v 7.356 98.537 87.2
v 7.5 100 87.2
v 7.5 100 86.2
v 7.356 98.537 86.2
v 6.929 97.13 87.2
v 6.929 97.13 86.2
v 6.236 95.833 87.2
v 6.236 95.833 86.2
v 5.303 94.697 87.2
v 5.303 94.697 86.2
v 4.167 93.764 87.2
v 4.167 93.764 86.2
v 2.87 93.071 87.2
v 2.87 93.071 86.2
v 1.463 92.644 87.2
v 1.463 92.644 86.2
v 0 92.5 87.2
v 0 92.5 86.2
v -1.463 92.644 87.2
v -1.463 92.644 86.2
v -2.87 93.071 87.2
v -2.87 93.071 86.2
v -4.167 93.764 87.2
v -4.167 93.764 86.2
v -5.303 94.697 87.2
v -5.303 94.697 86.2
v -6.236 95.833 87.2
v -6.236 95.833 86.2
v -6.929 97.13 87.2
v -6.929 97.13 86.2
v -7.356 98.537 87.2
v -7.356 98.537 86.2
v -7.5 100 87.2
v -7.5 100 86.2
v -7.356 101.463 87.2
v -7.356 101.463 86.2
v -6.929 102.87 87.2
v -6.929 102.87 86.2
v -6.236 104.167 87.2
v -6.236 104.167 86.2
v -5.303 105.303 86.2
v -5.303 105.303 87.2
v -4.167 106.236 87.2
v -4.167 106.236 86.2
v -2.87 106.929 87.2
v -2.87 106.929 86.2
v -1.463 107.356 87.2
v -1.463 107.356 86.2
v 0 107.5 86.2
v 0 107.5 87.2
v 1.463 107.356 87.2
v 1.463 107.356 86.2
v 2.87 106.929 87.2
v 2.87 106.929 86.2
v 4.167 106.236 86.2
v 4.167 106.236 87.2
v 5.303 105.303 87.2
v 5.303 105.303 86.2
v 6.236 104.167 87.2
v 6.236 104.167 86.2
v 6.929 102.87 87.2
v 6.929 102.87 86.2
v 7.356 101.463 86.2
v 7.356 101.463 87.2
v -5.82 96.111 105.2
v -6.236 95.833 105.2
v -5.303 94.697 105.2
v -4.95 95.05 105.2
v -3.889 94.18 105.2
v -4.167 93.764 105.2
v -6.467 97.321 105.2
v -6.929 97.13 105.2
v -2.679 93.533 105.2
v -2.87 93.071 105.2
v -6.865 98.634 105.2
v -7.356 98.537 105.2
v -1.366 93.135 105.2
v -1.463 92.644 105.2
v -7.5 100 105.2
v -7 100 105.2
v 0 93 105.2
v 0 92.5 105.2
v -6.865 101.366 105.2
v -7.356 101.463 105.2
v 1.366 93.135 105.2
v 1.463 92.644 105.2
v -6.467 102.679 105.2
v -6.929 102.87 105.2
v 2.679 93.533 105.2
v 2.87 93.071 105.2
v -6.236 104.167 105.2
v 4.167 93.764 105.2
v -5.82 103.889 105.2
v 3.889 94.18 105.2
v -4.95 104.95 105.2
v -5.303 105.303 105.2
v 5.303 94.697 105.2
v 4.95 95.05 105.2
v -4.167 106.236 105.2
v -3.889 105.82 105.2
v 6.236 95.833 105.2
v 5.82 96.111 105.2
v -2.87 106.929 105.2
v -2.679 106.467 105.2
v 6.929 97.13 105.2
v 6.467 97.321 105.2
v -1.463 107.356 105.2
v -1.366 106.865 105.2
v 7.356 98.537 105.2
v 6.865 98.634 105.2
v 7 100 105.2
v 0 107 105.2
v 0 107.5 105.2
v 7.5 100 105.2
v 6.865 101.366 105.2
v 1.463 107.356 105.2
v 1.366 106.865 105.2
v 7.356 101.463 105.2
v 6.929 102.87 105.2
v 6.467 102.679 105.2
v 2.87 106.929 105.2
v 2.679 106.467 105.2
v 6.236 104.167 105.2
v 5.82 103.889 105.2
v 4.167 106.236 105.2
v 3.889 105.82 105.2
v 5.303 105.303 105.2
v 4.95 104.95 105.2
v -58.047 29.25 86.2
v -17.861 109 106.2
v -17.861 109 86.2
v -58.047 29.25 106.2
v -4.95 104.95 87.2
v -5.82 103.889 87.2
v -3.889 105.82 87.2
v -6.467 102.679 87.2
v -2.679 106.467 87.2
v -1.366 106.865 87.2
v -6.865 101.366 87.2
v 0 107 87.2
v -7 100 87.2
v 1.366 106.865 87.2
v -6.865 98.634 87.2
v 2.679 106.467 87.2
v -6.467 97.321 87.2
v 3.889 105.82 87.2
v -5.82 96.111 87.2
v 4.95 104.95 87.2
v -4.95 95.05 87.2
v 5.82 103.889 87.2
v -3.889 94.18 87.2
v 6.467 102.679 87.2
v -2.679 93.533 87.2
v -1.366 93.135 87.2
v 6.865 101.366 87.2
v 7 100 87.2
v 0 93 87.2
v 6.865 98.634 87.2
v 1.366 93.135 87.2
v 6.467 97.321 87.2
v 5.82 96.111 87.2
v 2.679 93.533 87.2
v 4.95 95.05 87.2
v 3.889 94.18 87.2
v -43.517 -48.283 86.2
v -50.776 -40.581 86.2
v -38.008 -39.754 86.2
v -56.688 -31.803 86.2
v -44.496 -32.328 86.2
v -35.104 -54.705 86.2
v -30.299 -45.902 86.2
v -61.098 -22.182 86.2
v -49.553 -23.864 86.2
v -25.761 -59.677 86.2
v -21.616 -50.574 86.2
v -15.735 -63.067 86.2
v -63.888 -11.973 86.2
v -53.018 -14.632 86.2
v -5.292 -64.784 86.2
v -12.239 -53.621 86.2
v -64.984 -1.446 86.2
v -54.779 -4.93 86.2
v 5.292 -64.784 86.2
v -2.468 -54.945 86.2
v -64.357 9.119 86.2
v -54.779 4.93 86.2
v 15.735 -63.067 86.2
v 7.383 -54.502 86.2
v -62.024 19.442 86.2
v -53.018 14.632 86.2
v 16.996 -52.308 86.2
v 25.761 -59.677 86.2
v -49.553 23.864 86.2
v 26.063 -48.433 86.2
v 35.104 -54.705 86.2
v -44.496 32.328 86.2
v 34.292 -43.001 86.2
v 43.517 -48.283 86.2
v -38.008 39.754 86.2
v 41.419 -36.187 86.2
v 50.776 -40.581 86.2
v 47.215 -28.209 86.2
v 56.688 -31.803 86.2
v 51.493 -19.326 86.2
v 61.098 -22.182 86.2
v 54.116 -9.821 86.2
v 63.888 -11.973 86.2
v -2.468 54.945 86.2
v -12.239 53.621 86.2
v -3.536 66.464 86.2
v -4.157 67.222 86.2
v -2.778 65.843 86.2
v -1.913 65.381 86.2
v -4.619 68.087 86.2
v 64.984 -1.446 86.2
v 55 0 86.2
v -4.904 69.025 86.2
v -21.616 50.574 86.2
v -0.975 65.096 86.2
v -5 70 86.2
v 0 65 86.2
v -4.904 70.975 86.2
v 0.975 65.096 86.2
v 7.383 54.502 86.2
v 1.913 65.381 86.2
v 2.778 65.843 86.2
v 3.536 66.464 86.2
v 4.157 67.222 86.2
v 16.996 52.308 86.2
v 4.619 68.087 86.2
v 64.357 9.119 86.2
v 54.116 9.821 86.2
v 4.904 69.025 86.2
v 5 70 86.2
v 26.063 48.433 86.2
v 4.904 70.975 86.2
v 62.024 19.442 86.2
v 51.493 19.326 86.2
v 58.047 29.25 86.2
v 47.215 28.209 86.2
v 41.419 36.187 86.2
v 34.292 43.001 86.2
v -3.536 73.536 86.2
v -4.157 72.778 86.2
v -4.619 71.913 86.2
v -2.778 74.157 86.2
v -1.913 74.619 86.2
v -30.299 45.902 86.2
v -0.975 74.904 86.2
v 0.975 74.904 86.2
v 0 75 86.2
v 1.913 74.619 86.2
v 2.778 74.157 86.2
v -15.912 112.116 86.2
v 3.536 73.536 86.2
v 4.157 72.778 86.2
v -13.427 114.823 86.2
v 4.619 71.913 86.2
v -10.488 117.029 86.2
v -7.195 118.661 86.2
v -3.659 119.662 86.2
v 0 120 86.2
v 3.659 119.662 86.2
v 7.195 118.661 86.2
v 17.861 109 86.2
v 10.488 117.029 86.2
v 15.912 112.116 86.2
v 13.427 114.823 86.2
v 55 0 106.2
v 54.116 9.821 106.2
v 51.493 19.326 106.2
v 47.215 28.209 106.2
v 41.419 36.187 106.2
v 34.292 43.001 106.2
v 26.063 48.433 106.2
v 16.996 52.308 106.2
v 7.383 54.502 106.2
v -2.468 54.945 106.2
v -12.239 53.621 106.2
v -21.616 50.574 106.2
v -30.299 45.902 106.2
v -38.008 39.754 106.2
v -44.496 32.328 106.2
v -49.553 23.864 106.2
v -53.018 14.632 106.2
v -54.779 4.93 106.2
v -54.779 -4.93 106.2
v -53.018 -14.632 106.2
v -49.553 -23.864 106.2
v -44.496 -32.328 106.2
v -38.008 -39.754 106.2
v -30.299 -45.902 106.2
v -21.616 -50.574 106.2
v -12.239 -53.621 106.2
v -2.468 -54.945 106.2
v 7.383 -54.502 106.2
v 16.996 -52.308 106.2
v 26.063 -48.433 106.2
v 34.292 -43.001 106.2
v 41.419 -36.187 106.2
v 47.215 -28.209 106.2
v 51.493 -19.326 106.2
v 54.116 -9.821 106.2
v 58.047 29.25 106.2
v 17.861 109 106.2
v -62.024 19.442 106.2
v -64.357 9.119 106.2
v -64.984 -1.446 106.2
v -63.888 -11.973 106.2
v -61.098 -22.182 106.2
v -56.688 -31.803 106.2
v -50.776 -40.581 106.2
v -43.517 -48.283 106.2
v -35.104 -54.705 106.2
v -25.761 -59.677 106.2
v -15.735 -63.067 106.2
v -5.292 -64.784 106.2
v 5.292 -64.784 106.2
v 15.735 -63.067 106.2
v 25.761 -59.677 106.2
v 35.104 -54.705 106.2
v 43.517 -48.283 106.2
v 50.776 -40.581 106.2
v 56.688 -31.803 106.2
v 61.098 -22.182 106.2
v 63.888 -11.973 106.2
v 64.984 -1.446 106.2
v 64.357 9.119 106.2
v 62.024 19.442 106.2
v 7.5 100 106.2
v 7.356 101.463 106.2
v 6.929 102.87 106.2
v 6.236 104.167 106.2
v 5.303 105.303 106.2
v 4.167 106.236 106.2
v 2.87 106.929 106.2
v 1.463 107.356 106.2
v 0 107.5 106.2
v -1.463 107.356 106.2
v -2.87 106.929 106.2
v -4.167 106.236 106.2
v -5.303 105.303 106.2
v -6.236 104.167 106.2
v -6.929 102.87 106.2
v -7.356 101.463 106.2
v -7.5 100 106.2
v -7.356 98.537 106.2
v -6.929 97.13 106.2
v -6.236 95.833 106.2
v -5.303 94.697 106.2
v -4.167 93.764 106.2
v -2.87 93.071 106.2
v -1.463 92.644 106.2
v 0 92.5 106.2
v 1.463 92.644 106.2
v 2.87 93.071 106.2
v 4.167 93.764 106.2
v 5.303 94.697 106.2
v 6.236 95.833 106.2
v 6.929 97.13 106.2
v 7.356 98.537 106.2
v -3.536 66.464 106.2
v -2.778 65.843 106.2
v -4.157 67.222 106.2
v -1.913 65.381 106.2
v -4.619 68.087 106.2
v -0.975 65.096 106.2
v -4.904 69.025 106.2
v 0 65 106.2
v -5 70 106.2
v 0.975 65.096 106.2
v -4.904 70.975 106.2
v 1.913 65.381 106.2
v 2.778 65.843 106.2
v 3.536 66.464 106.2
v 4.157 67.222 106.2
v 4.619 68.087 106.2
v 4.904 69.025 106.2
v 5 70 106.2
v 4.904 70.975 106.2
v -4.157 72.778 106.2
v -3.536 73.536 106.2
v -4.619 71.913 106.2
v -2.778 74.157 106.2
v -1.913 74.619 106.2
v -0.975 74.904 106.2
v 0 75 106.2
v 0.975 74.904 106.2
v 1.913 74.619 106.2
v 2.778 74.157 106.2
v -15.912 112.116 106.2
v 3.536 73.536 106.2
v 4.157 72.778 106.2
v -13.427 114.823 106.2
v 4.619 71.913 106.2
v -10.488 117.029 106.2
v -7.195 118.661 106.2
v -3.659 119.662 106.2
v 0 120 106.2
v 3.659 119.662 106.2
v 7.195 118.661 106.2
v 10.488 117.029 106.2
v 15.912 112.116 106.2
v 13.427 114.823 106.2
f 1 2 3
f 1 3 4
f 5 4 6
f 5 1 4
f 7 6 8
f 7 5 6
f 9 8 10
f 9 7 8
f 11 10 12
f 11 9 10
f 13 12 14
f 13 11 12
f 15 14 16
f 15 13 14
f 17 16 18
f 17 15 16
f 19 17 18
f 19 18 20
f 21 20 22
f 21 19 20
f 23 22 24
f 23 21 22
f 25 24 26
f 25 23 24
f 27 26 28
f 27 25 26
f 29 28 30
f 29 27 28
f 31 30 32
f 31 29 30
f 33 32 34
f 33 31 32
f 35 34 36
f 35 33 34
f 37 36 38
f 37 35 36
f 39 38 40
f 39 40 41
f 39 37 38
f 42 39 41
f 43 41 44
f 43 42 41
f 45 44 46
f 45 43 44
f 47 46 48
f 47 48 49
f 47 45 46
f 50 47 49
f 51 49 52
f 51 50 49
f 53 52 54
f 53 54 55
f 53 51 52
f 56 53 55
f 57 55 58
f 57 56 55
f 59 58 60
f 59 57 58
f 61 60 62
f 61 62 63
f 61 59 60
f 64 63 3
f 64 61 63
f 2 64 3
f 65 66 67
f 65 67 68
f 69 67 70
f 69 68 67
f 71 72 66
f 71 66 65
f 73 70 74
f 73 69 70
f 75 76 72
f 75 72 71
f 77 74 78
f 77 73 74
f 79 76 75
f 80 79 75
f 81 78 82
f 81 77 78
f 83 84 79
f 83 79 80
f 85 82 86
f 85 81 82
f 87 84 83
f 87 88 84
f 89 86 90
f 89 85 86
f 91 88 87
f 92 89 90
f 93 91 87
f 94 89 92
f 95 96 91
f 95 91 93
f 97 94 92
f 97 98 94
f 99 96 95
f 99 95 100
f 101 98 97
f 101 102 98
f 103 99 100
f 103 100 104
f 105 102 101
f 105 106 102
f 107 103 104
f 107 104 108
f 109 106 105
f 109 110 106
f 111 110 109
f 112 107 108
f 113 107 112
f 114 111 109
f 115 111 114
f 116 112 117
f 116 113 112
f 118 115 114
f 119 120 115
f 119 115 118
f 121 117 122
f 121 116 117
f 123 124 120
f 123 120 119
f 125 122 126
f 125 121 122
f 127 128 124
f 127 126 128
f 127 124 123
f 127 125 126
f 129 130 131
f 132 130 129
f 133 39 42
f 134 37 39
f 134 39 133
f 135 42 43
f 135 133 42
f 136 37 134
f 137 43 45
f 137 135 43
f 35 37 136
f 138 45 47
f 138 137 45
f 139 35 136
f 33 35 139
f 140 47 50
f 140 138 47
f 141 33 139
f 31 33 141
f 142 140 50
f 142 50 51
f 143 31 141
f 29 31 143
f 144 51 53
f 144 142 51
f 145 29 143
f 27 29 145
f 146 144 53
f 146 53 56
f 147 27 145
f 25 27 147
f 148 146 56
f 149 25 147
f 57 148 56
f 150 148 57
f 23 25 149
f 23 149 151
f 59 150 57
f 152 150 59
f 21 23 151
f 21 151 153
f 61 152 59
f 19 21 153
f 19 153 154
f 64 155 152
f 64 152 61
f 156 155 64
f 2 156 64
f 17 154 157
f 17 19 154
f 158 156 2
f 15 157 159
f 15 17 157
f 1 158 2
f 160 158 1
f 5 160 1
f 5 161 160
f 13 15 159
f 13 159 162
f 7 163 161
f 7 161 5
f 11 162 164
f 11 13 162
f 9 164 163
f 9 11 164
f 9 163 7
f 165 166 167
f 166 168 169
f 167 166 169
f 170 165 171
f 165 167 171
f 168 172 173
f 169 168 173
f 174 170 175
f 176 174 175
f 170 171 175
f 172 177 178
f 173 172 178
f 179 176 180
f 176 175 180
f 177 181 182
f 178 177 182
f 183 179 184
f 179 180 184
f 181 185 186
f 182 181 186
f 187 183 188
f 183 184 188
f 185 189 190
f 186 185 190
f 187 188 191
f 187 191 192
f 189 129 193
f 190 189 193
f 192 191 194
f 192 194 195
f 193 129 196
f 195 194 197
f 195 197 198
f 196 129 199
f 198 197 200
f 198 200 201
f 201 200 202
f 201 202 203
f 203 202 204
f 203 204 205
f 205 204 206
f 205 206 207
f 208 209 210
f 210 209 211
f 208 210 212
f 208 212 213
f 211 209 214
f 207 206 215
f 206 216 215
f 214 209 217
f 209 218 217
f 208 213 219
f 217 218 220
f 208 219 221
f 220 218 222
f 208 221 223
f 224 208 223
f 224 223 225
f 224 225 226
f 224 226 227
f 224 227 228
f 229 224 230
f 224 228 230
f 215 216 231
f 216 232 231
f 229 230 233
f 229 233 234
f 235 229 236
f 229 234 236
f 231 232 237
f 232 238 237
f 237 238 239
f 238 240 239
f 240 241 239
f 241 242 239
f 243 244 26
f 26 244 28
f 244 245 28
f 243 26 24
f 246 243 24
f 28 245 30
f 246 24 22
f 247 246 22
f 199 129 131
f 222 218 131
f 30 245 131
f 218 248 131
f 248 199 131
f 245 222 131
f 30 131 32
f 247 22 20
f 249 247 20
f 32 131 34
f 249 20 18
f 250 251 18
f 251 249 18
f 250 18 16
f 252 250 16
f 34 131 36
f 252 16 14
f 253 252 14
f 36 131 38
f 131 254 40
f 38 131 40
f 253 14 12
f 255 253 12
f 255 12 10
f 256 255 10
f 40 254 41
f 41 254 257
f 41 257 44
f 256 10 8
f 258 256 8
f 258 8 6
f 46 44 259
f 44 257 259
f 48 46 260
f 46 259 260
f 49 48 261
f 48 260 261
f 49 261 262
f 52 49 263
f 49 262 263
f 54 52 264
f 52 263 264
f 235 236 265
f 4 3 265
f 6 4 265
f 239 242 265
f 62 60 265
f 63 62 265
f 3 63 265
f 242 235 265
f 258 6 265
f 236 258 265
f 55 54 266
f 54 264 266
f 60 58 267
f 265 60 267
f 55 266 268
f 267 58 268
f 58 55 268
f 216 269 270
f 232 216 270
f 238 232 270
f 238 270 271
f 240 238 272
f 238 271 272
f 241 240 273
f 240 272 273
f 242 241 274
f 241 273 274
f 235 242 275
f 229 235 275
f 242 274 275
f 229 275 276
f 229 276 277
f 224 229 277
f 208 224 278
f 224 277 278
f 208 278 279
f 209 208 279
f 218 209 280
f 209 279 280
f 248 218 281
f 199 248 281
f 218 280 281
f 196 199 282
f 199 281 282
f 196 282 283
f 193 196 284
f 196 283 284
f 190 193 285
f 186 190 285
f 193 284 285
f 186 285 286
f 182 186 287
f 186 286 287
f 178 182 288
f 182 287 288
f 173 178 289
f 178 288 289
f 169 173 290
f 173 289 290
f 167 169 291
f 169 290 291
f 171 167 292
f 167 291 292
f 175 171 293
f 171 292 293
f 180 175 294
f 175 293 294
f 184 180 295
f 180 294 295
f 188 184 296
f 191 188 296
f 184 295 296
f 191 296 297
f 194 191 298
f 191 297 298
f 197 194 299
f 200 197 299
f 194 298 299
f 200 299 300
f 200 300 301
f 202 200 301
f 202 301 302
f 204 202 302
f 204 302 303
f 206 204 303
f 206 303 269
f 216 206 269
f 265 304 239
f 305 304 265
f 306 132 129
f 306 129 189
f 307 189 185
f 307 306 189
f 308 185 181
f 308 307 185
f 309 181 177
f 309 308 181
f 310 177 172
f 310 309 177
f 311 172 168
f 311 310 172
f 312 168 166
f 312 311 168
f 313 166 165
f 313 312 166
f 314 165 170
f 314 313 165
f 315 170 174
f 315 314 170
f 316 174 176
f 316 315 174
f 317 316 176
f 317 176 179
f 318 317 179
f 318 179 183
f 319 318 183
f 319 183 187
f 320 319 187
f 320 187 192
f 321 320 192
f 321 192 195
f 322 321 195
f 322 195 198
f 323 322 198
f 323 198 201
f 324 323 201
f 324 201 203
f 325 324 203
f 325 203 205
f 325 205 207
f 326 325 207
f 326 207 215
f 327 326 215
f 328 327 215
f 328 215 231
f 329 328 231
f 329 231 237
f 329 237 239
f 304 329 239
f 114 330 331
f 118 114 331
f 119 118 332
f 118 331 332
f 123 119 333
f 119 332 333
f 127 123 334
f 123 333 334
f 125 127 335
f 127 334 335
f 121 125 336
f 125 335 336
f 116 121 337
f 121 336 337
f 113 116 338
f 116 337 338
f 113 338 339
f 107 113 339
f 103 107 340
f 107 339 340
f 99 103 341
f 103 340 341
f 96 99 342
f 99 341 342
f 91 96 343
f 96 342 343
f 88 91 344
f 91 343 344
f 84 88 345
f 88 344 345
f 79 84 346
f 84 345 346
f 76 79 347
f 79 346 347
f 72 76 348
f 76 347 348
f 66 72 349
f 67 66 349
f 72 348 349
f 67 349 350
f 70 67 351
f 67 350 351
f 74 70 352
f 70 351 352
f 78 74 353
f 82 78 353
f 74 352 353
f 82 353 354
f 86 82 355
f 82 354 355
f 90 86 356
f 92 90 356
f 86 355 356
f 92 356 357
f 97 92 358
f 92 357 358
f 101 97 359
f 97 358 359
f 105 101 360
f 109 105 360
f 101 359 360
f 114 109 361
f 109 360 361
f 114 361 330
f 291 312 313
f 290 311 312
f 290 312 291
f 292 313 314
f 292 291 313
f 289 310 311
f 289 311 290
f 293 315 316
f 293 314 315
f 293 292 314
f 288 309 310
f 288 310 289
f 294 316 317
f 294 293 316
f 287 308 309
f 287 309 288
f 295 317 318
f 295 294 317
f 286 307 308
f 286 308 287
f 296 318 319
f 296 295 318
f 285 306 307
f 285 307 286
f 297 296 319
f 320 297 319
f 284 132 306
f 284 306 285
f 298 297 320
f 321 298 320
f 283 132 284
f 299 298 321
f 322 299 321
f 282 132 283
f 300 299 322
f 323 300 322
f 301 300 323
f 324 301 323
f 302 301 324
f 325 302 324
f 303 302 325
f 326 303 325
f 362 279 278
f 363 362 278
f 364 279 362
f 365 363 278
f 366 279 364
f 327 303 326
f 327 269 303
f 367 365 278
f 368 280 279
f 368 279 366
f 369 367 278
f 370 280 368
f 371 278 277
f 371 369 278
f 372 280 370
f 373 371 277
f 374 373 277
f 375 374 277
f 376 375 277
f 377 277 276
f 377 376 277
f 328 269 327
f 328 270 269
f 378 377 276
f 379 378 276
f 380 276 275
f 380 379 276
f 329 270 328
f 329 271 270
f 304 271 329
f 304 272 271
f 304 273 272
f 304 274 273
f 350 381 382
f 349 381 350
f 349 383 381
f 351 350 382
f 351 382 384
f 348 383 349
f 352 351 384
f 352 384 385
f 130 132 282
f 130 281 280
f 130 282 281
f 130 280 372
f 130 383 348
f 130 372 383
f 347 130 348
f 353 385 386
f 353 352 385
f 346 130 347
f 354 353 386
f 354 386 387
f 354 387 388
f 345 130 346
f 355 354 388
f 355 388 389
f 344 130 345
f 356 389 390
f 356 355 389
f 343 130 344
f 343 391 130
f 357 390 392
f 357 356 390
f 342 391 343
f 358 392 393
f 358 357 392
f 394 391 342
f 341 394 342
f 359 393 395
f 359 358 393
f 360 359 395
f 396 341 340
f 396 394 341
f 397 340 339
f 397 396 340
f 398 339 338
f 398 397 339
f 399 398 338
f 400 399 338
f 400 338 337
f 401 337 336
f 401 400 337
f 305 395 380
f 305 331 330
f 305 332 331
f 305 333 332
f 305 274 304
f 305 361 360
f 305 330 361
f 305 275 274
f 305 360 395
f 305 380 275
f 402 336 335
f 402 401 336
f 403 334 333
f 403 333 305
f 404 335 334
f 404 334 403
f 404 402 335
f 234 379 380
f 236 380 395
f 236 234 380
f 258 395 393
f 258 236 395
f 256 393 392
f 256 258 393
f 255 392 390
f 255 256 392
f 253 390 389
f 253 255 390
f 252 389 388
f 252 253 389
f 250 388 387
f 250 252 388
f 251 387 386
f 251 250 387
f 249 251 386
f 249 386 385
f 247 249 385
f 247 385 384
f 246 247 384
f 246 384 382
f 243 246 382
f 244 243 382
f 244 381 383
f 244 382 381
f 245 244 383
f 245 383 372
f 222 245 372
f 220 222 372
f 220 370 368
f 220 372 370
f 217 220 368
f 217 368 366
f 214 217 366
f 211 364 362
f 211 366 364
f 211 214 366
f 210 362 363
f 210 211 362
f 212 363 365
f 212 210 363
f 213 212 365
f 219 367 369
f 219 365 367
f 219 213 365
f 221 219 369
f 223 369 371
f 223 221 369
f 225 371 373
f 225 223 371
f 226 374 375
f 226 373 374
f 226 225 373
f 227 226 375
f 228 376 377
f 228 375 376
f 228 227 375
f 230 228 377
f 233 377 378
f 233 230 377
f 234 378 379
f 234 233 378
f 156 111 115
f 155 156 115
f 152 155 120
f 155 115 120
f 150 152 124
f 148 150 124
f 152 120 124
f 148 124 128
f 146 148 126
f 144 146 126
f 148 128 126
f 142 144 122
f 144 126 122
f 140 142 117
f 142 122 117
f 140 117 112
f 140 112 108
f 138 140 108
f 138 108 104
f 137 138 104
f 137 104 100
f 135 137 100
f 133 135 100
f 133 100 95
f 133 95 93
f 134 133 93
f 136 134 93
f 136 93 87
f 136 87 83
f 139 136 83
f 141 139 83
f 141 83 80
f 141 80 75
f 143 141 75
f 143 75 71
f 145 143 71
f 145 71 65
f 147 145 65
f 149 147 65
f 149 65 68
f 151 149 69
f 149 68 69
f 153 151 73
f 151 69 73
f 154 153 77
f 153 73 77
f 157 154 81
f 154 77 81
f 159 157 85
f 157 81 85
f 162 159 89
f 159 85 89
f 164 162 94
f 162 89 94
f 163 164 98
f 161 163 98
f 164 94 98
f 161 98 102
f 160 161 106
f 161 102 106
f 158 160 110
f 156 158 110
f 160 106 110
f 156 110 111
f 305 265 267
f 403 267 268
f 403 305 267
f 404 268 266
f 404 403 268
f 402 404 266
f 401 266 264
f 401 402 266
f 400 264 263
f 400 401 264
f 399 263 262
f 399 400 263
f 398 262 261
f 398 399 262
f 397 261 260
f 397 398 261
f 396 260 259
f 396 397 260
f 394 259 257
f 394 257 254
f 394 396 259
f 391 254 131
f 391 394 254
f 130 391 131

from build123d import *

# Parameters (mm, degrees)
SKETCH2_R           = 5
BOSS_EXTRUDE1_DEPTH = 10
SKETCH3_R           = 10
SKETCH3_R_2         = 5
BOSS_EXTRUDE2_DEPTH = 76.2
BOSS_EXTRUDE3_START = 86.2
SKETCH2_2_R         = 5
BOSS_EXTRUDE3_DEPTH = 20
SKETCH5_R           = 65
BOSS_EXTRUDE4_DEPTH = 20
SKETCH6_R           = 55
CUT_EXTRUDE1_DEPTH  = 20
SKETCH7_R           = 80
CUT_EXTRUDE2_DEPTH  = 135.370532484
SKETCH8_R           = 7
BOSS_EXTRUDE6_DEPTH = 20
SKETCH9_R           = 7.5
CUT_EXTRUDE3_DEPTH  = 1
CUT_EXTRUDE4_START  = -1
SKETCH10_R          = 7.5
CUT_EXTRUDE4_DEPTH  = 1


with BuildPart() as part:
    # Sketch2 → Boss-Extrude1 (new body)
    with BuildSketch(Plane.XY):
        with BuildLine():
            Line((-19.794866372, 2.857142857), (-9.897433186, 71.428571429))
            ThreePointArc((-9.897433186, 71.428571429), (0, 80), (9.897433186, 71.428571429))
            Line((9.897433186, 71.428571429), (19.794866372, 2.857142857))
            ThreePointArc((19.794866372, 2.857142857), (0, -20), (-19.794866372, 2.857142857))
        make_face()
        with Locations((0, 70)):
            Circle(SKETCH2_R, mode=Mode.SUBTRACT)
        with BuildLine():
            Line((-2.5, 9.682458366), (-2.5, 12))
            Line((-2.5, 12), (2.5, 12))
            Line((2.5, 12), (2.5, 9.682458366))
            ThreePointArc((2.5, 9.682458366), (0, -10), (-2.5, 9.682458366))
        make_face(mode=Mode.SUBTRACT)
    extrude(amount=BOSS_EXTRUDE1_DEPTH)

    # Sketch3 → Boss-Extrude2 (add)
    with BuildSketch(Plane.XY.offset(10)):
        with Locations(Location((0, 70, 0), (0, 0, 171.786789298))):
            Circle(SKETCH3_R)
        with Locations((0, 70)):
            Circle(SKETCH3_R_2, mode=Mode.SUBTRACT)
    extrude(amount=BOSS_EXTRUDE2_DEPTH)

    # Sketch2<2> → Boss-Extrude3 (add)
    with BuildSketch(Plane.XY.offset(BOSS_EXTRUDE3_START)):
        with BuildLine():
            Line((-19.794866372, 2.857142857), (-9.897433186, 71.428571429))
            ThreePointArc((-9.897433186, 71.428571429), (0, 80), (9.897433186, 71.428571429))
            Line((9.897433186, 71.428571429), (19.794866372, 2.857142857))
            ThreePointArc((19.794866372, 2.857142857), (0, -20), (-19.794866372, 2.857142857))
        make_face()
        with Locations((0, 70)):
            Circle(SKETCH2_2_R, mode=Mode.SUBTRACT)
        with BuildLine():
            Line((-2.5, 9.682458366), (-2.5, 12))
            Line((-2.5, 12), (2.5, 12))
            Line((2.5, 12), (2.5, 9.682458366))
            ThreePointArc((2.5, 9.682458366), (0, -10), (-2.5, 9.682458366))
        make_face(mode=Mode.SUBTRACT)
    extrude(amount=BOSS_EXTRUDE3_DEPTH)

    # Sketch5 → Boss-Extrude4 (add)
    with BuildSketch(Plane.XY.offset(106.2)):
        Circle(SKETCH5_R)
    extrude(amount=-BOSS_EXTRUDE4_DEPTH)

    # Sketch6 → Cut-Extrude1 (cut)
    with BuildSketch(Plane.XY.offset(106.2)):
        Circle(SKETCH6_R)
    extrude(amount=-CUT_EXTRUDE1_DEPTH, mode=Mode.SUBTRACT)

    # Sketch7 → Cut-Extrude2 (cut, through all)
    with BuildSketch(Plane(origin=(0, 0, 86.2), x_dir=(-1, 0, 0), z_dir=(0, 0, -1))):
        Circle(SKETCH7_R)
    extrude(amount=CUT_EXTRUDE2_DEPTH, mode=Mode.SUBTRACT)

    # Sketch8 → Boss-Extrude6 (add)
    with BuildSketch(Plane.XY.offset(106.2)):
        with BuildLine():
            Line((-17.860571099, 109), (-58.046856073, 29.25))
            ThreePointArc((-58.046856073, 29.25), (-38.646753366, 52.263069698), (-10.959640032, 64.06938653))
            Line((-10.959640032, 64.06938653), (-9.897433186, 71.428571429))
            ThreePointArc((-9.897433186, 71.428571429), (0, 80), (9.897433186, 71.428571429))
            Line((9.897433186, 71.428571429), (10.959640032, 64.06938653))
            ThreePointArc((10.959640032, 64.06938653), (38.646753366, 52.263069698), (58.046856073, 29.25))
            Line((58.046856073, 29.25), (17.860571099, 109))
            ThreePointArc((17.860571099, 109), (0, 120), (-17.860571099, 109))
        make_face()
        with Locations((0, 100)):
            Circle(SKETCH8_R, mode=Mode.SUBTRACT)
    extrude(amount=-BOSS_EXTRUDE6_DEPTH)

    # Sketch9 → Cut-Extrude3 (cut)
    with BuildSketch(Plane.XY.offset(106.2)):
        with Locations((0, 100)):
            Circle(SKETCH9_R)
    extrude(amount=-CUT_EXTRUDE3_DEPTH, mode=Mode.SUBTRACT)

    # Sketch10 → Cut-Extrude4 (cut)
    with BuildSketch(Plane(origin=(0, 0, 86.2), x_dir=(-1, 0, 0), z_dir=(0, 0, -1)).offset(CUT_EXTRUDE4_START)):
        with Locations(Location((0, 100, 0), (0, 0, 180))):
            Circle(SKETCH10_R)
    extrude(amount=CUT_EXTRUDE4_DEPTH, mode=Mode.SUBTRACT)


solid = part.part
